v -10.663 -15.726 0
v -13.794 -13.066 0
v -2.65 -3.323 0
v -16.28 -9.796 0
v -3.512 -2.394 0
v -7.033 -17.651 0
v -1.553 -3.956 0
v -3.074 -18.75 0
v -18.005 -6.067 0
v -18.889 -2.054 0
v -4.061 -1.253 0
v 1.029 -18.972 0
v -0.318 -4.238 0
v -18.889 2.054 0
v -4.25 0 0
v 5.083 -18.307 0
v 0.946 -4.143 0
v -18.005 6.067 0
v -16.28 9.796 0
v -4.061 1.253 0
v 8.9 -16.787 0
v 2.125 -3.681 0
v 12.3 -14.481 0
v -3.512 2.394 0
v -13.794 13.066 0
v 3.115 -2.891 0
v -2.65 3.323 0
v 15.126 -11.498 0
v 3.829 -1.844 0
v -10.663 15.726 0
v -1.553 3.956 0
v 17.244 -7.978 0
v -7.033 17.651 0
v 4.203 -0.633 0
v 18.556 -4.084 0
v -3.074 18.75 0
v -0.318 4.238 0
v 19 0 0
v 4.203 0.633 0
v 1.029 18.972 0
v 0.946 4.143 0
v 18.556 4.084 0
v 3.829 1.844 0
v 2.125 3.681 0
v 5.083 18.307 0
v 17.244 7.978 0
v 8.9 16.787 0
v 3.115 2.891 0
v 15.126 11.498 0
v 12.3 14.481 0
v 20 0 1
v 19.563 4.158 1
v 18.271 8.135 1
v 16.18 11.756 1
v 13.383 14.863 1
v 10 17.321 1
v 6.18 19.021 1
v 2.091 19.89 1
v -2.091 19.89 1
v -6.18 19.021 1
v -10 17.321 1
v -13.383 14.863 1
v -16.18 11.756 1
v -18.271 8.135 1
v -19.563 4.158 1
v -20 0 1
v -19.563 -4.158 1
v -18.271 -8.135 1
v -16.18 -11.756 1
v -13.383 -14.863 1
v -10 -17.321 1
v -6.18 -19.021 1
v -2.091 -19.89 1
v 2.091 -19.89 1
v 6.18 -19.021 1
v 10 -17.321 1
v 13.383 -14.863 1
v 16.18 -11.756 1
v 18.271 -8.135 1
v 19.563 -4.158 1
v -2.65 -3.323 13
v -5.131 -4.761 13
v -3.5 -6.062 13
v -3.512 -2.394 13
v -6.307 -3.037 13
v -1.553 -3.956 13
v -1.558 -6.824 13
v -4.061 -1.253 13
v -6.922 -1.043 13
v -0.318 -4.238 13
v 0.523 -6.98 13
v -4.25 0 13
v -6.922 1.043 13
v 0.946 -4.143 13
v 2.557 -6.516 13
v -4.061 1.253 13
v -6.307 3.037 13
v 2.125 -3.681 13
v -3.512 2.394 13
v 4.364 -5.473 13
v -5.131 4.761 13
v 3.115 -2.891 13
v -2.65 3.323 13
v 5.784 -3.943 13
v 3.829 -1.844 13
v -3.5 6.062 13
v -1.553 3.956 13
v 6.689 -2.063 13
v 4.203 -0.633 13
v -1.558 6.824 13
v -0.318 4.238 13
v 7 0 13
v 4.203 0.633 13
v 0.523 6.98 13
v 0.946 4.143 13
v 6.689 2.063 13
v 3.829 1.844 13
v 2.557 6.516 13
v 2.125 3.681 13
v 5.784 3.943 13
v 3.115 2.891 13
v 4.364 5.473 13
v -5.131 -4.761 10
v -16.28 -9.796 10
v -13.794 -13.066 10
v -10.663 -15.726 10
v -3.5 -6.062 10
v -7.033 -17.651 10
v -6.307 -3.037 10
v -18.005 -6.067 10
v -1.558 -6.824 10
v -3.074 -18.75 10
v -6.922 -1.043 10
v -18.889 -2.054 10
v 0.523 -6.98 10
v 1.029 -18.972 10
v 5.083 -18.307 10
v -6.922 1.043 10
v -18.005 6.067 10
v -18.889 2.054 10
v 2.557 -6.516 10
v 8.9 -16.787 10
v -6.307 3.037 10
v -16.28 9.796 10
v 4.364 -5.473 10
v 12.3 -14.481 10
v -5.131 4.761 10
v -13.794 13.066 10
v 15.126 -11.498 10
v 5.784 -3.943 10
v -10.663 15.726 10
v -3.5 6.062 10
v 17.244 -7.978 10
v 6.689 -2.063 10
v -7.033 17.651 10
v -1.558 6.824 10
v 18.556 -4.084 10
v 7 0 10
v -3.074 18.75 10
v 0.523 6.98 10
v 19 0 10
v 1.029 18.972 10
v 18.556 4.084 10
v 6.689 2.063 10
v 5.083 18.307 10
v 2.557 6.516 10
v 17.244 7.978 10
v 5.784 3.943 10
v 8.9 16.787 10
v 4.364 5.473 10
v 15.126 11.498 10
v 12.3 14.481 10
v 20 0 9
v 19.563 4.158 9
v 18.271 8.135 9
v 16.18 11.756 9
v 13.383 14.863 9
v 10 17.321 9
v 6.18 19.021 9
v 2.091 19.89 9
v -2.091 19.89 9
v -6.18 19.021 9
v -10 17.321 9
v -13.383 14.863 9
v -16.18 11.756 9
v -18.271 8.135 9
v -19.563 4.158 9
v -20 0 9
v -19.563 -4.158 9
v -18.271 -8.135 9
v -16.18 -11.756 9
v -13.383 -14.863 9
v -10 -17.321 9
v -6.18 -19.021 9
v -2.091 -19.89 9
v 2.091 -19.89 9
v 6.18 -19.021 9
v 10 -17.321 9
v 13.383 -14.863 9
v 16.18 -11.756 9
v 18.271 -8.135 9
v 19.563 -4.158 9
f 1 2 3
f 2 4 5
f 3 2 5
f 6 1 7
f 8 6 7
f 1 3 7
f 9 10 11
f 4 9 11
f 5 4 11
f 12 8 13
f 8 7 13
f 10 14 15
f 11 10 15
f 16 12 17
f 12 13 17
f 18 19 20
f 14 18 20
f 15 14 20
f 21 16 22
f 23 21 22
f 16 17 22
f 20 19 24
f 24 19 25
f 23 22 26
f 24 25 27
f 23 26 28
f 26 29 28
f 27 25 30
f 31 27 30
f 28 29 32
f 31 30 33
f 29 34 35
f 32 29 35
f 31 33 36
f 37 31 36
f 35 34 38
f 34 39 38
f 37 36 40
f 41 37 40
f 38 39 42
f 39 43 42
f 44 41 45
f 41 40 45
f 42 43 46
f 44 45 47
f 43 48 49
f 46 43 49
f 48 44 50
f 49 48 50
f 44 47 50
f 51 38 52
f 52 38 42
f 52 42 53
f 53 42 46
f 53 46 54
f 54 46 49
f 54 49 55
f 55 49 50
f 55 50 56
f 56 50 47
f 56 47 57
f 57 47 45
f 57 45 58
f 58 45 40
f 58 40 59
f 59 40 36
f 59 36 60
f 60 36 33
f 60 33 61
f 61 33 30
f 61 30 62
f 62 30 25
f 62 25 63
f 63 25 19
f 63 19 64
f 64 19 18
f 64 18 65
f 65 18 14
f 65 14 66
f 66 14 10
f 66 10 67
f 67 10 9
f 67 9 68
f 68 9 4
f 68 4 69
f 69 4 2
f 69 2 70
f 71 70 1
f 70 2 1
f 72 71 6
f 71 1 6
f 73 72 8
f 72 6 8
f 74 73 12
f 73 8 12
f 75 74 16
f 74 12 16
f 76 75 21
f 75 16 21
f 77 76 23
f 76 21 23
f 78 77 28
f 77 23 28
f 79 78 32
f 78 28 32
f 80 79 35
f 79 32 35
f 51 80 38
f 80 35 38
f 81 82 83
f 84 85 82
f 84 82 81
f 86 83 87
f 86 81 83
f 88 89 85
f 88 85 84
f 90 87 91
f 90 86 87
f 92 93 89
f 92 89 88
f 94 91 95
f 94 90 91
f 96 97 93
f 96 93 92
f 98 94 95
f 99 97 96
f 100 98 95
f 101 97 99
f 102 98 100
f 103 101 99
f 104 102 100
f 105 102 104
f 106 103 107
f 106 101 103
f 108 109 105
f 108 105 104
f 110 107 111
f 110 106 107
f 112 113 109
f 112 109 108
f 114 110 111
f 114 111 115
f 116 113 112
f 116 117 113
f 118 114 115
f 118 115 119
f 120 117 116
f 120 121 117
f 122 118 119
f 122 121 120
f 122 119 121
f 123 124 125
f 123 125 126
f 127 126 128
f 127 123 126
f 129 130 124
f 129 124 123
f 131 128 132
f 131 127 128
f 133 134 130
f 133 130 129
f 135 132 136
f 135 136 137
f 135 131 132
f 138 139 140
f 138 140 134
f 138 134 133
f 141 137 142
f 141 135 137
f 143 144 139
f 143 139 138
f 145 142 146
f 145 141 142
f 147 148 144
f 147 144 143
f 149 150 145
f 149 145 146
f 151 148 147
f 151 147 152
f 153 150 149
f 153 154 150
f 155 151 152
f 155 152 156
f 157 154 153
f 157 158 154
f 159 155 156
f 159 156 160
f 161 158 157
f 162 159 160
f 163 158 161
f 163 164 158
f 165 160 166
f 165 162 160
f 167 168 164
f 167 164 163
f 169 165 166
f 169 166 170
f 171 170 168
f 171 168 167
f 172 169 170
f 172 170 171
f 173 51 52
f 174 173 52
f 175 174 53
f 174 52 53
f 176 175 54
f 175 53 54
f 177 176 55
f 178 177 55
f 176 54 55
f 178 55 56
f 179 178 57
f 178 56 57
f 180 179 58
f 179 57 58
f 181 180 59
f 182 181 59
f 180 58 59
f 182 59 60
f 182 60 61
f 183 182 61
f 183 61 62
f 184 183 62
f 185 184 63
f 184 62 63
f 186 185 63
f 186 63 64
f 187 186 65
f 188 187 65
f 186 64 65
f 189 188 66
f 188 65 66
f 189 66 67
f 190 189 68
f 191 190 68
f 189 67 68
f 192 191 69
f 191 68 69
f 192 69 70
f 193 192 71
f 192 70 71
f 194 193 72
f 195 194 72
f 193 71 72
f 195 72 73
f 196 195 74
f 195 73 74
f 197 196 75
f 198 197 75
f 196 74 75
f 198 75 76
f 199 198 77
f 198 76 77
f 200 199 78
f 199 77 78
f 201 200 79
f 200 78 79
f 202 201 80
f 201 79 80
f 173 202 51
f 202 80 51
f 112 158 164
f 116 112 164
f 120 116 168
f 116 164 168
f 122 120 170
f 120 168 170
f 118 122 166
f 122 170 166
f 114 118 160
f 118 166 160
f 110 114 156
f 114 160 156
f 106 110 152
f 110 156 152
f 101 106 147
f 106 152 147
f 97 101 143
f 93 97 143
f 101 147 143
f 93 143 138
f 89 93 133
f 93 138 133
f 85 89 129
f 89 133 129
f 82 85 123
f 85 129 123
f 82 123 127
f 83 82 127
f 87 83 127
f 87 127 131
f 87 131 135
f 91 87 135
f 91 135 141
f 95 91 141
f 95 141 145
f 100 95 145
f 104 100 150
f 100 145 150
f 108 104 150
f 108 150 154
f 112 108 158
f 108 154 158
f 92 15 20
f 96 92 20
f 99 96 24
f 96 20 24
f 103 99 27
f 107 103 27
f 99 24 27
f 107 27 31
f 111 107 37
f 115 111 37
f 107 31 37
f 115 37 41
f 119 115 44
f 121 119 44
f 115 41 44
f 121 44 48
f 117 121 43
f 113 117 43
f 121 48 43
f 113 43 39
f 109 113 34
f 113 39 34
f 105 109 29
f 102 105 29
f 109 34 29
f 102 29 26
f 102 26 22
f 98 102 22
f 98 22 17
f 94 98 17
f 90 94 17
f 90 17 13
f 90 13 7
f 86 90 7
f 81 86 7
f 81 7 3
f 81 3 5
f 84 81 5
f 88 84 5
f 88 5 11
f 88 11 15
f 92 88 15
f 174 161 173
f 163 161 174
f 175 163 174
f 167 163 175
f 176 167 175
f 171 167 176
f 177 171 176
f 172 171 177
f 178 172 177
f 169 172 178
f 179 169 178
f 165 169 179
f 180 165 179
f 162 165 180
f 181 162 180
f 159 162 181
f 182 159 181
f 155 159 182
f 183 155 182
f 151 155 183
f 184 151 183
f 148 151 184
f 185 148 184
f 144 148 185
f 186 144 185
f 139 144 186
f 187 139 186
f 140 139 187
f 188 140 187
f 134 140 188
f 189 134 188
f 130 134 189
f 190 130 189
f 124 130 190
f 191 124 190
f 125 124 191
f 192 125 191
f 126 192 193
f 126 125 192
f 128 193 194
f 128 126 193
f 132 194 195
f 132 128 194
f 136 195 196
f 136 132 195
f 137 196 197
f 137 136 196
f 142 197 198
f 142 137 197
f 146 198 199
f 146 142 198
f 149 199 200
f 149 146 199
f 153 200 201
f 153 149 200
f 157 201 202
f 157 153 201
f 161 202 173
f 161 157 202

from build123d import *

# Parameters (mm, degrees)
ESQUISSE1_R        = 20
BOSS_EXTRU_1_DEPTH = 10
CHANFREIN1_SIZE    = 1
ESQUISSE2_R        = 7
BOSS_EXTRU_2_DEPTH = 3
TROU_TARAUD_M101_D = 8.5


with BuildPart() as part:
    # Esquisse1 → Boss.-Extru.1 (new body)
    with BuildSketch(Plane.XY):
        Circle(ESQUISSE1_R)
    extrude(amount=BOSS_EXTRU_1_DEPTH)

    # Chanfrein1
    chanfrein1_edges = [part.edges().sort_by_distance(p)[0] for p in [
        (-20, 0, 0),
        (-20, 0, 10),
    ]]
    chamfer(chanfrein1_edges, length=CHANFREIN1_SIZE)

    # Esquisse2 → Boss.-Extru.2 (add)
    with BuildSketch(Plane.XY.offset(10)):
        Circle(ESQUISSE2_R)
    extrude(amount=BOSS_EXTRU_2_DEPTH)

    # Trou taraudé M101 (through all)
    with Locations(Plane.XY.offset(13)):
        with Locations((0, 0)):
            Hole(TROU_TARAUD_M101_D / 2)


solid = part.part
